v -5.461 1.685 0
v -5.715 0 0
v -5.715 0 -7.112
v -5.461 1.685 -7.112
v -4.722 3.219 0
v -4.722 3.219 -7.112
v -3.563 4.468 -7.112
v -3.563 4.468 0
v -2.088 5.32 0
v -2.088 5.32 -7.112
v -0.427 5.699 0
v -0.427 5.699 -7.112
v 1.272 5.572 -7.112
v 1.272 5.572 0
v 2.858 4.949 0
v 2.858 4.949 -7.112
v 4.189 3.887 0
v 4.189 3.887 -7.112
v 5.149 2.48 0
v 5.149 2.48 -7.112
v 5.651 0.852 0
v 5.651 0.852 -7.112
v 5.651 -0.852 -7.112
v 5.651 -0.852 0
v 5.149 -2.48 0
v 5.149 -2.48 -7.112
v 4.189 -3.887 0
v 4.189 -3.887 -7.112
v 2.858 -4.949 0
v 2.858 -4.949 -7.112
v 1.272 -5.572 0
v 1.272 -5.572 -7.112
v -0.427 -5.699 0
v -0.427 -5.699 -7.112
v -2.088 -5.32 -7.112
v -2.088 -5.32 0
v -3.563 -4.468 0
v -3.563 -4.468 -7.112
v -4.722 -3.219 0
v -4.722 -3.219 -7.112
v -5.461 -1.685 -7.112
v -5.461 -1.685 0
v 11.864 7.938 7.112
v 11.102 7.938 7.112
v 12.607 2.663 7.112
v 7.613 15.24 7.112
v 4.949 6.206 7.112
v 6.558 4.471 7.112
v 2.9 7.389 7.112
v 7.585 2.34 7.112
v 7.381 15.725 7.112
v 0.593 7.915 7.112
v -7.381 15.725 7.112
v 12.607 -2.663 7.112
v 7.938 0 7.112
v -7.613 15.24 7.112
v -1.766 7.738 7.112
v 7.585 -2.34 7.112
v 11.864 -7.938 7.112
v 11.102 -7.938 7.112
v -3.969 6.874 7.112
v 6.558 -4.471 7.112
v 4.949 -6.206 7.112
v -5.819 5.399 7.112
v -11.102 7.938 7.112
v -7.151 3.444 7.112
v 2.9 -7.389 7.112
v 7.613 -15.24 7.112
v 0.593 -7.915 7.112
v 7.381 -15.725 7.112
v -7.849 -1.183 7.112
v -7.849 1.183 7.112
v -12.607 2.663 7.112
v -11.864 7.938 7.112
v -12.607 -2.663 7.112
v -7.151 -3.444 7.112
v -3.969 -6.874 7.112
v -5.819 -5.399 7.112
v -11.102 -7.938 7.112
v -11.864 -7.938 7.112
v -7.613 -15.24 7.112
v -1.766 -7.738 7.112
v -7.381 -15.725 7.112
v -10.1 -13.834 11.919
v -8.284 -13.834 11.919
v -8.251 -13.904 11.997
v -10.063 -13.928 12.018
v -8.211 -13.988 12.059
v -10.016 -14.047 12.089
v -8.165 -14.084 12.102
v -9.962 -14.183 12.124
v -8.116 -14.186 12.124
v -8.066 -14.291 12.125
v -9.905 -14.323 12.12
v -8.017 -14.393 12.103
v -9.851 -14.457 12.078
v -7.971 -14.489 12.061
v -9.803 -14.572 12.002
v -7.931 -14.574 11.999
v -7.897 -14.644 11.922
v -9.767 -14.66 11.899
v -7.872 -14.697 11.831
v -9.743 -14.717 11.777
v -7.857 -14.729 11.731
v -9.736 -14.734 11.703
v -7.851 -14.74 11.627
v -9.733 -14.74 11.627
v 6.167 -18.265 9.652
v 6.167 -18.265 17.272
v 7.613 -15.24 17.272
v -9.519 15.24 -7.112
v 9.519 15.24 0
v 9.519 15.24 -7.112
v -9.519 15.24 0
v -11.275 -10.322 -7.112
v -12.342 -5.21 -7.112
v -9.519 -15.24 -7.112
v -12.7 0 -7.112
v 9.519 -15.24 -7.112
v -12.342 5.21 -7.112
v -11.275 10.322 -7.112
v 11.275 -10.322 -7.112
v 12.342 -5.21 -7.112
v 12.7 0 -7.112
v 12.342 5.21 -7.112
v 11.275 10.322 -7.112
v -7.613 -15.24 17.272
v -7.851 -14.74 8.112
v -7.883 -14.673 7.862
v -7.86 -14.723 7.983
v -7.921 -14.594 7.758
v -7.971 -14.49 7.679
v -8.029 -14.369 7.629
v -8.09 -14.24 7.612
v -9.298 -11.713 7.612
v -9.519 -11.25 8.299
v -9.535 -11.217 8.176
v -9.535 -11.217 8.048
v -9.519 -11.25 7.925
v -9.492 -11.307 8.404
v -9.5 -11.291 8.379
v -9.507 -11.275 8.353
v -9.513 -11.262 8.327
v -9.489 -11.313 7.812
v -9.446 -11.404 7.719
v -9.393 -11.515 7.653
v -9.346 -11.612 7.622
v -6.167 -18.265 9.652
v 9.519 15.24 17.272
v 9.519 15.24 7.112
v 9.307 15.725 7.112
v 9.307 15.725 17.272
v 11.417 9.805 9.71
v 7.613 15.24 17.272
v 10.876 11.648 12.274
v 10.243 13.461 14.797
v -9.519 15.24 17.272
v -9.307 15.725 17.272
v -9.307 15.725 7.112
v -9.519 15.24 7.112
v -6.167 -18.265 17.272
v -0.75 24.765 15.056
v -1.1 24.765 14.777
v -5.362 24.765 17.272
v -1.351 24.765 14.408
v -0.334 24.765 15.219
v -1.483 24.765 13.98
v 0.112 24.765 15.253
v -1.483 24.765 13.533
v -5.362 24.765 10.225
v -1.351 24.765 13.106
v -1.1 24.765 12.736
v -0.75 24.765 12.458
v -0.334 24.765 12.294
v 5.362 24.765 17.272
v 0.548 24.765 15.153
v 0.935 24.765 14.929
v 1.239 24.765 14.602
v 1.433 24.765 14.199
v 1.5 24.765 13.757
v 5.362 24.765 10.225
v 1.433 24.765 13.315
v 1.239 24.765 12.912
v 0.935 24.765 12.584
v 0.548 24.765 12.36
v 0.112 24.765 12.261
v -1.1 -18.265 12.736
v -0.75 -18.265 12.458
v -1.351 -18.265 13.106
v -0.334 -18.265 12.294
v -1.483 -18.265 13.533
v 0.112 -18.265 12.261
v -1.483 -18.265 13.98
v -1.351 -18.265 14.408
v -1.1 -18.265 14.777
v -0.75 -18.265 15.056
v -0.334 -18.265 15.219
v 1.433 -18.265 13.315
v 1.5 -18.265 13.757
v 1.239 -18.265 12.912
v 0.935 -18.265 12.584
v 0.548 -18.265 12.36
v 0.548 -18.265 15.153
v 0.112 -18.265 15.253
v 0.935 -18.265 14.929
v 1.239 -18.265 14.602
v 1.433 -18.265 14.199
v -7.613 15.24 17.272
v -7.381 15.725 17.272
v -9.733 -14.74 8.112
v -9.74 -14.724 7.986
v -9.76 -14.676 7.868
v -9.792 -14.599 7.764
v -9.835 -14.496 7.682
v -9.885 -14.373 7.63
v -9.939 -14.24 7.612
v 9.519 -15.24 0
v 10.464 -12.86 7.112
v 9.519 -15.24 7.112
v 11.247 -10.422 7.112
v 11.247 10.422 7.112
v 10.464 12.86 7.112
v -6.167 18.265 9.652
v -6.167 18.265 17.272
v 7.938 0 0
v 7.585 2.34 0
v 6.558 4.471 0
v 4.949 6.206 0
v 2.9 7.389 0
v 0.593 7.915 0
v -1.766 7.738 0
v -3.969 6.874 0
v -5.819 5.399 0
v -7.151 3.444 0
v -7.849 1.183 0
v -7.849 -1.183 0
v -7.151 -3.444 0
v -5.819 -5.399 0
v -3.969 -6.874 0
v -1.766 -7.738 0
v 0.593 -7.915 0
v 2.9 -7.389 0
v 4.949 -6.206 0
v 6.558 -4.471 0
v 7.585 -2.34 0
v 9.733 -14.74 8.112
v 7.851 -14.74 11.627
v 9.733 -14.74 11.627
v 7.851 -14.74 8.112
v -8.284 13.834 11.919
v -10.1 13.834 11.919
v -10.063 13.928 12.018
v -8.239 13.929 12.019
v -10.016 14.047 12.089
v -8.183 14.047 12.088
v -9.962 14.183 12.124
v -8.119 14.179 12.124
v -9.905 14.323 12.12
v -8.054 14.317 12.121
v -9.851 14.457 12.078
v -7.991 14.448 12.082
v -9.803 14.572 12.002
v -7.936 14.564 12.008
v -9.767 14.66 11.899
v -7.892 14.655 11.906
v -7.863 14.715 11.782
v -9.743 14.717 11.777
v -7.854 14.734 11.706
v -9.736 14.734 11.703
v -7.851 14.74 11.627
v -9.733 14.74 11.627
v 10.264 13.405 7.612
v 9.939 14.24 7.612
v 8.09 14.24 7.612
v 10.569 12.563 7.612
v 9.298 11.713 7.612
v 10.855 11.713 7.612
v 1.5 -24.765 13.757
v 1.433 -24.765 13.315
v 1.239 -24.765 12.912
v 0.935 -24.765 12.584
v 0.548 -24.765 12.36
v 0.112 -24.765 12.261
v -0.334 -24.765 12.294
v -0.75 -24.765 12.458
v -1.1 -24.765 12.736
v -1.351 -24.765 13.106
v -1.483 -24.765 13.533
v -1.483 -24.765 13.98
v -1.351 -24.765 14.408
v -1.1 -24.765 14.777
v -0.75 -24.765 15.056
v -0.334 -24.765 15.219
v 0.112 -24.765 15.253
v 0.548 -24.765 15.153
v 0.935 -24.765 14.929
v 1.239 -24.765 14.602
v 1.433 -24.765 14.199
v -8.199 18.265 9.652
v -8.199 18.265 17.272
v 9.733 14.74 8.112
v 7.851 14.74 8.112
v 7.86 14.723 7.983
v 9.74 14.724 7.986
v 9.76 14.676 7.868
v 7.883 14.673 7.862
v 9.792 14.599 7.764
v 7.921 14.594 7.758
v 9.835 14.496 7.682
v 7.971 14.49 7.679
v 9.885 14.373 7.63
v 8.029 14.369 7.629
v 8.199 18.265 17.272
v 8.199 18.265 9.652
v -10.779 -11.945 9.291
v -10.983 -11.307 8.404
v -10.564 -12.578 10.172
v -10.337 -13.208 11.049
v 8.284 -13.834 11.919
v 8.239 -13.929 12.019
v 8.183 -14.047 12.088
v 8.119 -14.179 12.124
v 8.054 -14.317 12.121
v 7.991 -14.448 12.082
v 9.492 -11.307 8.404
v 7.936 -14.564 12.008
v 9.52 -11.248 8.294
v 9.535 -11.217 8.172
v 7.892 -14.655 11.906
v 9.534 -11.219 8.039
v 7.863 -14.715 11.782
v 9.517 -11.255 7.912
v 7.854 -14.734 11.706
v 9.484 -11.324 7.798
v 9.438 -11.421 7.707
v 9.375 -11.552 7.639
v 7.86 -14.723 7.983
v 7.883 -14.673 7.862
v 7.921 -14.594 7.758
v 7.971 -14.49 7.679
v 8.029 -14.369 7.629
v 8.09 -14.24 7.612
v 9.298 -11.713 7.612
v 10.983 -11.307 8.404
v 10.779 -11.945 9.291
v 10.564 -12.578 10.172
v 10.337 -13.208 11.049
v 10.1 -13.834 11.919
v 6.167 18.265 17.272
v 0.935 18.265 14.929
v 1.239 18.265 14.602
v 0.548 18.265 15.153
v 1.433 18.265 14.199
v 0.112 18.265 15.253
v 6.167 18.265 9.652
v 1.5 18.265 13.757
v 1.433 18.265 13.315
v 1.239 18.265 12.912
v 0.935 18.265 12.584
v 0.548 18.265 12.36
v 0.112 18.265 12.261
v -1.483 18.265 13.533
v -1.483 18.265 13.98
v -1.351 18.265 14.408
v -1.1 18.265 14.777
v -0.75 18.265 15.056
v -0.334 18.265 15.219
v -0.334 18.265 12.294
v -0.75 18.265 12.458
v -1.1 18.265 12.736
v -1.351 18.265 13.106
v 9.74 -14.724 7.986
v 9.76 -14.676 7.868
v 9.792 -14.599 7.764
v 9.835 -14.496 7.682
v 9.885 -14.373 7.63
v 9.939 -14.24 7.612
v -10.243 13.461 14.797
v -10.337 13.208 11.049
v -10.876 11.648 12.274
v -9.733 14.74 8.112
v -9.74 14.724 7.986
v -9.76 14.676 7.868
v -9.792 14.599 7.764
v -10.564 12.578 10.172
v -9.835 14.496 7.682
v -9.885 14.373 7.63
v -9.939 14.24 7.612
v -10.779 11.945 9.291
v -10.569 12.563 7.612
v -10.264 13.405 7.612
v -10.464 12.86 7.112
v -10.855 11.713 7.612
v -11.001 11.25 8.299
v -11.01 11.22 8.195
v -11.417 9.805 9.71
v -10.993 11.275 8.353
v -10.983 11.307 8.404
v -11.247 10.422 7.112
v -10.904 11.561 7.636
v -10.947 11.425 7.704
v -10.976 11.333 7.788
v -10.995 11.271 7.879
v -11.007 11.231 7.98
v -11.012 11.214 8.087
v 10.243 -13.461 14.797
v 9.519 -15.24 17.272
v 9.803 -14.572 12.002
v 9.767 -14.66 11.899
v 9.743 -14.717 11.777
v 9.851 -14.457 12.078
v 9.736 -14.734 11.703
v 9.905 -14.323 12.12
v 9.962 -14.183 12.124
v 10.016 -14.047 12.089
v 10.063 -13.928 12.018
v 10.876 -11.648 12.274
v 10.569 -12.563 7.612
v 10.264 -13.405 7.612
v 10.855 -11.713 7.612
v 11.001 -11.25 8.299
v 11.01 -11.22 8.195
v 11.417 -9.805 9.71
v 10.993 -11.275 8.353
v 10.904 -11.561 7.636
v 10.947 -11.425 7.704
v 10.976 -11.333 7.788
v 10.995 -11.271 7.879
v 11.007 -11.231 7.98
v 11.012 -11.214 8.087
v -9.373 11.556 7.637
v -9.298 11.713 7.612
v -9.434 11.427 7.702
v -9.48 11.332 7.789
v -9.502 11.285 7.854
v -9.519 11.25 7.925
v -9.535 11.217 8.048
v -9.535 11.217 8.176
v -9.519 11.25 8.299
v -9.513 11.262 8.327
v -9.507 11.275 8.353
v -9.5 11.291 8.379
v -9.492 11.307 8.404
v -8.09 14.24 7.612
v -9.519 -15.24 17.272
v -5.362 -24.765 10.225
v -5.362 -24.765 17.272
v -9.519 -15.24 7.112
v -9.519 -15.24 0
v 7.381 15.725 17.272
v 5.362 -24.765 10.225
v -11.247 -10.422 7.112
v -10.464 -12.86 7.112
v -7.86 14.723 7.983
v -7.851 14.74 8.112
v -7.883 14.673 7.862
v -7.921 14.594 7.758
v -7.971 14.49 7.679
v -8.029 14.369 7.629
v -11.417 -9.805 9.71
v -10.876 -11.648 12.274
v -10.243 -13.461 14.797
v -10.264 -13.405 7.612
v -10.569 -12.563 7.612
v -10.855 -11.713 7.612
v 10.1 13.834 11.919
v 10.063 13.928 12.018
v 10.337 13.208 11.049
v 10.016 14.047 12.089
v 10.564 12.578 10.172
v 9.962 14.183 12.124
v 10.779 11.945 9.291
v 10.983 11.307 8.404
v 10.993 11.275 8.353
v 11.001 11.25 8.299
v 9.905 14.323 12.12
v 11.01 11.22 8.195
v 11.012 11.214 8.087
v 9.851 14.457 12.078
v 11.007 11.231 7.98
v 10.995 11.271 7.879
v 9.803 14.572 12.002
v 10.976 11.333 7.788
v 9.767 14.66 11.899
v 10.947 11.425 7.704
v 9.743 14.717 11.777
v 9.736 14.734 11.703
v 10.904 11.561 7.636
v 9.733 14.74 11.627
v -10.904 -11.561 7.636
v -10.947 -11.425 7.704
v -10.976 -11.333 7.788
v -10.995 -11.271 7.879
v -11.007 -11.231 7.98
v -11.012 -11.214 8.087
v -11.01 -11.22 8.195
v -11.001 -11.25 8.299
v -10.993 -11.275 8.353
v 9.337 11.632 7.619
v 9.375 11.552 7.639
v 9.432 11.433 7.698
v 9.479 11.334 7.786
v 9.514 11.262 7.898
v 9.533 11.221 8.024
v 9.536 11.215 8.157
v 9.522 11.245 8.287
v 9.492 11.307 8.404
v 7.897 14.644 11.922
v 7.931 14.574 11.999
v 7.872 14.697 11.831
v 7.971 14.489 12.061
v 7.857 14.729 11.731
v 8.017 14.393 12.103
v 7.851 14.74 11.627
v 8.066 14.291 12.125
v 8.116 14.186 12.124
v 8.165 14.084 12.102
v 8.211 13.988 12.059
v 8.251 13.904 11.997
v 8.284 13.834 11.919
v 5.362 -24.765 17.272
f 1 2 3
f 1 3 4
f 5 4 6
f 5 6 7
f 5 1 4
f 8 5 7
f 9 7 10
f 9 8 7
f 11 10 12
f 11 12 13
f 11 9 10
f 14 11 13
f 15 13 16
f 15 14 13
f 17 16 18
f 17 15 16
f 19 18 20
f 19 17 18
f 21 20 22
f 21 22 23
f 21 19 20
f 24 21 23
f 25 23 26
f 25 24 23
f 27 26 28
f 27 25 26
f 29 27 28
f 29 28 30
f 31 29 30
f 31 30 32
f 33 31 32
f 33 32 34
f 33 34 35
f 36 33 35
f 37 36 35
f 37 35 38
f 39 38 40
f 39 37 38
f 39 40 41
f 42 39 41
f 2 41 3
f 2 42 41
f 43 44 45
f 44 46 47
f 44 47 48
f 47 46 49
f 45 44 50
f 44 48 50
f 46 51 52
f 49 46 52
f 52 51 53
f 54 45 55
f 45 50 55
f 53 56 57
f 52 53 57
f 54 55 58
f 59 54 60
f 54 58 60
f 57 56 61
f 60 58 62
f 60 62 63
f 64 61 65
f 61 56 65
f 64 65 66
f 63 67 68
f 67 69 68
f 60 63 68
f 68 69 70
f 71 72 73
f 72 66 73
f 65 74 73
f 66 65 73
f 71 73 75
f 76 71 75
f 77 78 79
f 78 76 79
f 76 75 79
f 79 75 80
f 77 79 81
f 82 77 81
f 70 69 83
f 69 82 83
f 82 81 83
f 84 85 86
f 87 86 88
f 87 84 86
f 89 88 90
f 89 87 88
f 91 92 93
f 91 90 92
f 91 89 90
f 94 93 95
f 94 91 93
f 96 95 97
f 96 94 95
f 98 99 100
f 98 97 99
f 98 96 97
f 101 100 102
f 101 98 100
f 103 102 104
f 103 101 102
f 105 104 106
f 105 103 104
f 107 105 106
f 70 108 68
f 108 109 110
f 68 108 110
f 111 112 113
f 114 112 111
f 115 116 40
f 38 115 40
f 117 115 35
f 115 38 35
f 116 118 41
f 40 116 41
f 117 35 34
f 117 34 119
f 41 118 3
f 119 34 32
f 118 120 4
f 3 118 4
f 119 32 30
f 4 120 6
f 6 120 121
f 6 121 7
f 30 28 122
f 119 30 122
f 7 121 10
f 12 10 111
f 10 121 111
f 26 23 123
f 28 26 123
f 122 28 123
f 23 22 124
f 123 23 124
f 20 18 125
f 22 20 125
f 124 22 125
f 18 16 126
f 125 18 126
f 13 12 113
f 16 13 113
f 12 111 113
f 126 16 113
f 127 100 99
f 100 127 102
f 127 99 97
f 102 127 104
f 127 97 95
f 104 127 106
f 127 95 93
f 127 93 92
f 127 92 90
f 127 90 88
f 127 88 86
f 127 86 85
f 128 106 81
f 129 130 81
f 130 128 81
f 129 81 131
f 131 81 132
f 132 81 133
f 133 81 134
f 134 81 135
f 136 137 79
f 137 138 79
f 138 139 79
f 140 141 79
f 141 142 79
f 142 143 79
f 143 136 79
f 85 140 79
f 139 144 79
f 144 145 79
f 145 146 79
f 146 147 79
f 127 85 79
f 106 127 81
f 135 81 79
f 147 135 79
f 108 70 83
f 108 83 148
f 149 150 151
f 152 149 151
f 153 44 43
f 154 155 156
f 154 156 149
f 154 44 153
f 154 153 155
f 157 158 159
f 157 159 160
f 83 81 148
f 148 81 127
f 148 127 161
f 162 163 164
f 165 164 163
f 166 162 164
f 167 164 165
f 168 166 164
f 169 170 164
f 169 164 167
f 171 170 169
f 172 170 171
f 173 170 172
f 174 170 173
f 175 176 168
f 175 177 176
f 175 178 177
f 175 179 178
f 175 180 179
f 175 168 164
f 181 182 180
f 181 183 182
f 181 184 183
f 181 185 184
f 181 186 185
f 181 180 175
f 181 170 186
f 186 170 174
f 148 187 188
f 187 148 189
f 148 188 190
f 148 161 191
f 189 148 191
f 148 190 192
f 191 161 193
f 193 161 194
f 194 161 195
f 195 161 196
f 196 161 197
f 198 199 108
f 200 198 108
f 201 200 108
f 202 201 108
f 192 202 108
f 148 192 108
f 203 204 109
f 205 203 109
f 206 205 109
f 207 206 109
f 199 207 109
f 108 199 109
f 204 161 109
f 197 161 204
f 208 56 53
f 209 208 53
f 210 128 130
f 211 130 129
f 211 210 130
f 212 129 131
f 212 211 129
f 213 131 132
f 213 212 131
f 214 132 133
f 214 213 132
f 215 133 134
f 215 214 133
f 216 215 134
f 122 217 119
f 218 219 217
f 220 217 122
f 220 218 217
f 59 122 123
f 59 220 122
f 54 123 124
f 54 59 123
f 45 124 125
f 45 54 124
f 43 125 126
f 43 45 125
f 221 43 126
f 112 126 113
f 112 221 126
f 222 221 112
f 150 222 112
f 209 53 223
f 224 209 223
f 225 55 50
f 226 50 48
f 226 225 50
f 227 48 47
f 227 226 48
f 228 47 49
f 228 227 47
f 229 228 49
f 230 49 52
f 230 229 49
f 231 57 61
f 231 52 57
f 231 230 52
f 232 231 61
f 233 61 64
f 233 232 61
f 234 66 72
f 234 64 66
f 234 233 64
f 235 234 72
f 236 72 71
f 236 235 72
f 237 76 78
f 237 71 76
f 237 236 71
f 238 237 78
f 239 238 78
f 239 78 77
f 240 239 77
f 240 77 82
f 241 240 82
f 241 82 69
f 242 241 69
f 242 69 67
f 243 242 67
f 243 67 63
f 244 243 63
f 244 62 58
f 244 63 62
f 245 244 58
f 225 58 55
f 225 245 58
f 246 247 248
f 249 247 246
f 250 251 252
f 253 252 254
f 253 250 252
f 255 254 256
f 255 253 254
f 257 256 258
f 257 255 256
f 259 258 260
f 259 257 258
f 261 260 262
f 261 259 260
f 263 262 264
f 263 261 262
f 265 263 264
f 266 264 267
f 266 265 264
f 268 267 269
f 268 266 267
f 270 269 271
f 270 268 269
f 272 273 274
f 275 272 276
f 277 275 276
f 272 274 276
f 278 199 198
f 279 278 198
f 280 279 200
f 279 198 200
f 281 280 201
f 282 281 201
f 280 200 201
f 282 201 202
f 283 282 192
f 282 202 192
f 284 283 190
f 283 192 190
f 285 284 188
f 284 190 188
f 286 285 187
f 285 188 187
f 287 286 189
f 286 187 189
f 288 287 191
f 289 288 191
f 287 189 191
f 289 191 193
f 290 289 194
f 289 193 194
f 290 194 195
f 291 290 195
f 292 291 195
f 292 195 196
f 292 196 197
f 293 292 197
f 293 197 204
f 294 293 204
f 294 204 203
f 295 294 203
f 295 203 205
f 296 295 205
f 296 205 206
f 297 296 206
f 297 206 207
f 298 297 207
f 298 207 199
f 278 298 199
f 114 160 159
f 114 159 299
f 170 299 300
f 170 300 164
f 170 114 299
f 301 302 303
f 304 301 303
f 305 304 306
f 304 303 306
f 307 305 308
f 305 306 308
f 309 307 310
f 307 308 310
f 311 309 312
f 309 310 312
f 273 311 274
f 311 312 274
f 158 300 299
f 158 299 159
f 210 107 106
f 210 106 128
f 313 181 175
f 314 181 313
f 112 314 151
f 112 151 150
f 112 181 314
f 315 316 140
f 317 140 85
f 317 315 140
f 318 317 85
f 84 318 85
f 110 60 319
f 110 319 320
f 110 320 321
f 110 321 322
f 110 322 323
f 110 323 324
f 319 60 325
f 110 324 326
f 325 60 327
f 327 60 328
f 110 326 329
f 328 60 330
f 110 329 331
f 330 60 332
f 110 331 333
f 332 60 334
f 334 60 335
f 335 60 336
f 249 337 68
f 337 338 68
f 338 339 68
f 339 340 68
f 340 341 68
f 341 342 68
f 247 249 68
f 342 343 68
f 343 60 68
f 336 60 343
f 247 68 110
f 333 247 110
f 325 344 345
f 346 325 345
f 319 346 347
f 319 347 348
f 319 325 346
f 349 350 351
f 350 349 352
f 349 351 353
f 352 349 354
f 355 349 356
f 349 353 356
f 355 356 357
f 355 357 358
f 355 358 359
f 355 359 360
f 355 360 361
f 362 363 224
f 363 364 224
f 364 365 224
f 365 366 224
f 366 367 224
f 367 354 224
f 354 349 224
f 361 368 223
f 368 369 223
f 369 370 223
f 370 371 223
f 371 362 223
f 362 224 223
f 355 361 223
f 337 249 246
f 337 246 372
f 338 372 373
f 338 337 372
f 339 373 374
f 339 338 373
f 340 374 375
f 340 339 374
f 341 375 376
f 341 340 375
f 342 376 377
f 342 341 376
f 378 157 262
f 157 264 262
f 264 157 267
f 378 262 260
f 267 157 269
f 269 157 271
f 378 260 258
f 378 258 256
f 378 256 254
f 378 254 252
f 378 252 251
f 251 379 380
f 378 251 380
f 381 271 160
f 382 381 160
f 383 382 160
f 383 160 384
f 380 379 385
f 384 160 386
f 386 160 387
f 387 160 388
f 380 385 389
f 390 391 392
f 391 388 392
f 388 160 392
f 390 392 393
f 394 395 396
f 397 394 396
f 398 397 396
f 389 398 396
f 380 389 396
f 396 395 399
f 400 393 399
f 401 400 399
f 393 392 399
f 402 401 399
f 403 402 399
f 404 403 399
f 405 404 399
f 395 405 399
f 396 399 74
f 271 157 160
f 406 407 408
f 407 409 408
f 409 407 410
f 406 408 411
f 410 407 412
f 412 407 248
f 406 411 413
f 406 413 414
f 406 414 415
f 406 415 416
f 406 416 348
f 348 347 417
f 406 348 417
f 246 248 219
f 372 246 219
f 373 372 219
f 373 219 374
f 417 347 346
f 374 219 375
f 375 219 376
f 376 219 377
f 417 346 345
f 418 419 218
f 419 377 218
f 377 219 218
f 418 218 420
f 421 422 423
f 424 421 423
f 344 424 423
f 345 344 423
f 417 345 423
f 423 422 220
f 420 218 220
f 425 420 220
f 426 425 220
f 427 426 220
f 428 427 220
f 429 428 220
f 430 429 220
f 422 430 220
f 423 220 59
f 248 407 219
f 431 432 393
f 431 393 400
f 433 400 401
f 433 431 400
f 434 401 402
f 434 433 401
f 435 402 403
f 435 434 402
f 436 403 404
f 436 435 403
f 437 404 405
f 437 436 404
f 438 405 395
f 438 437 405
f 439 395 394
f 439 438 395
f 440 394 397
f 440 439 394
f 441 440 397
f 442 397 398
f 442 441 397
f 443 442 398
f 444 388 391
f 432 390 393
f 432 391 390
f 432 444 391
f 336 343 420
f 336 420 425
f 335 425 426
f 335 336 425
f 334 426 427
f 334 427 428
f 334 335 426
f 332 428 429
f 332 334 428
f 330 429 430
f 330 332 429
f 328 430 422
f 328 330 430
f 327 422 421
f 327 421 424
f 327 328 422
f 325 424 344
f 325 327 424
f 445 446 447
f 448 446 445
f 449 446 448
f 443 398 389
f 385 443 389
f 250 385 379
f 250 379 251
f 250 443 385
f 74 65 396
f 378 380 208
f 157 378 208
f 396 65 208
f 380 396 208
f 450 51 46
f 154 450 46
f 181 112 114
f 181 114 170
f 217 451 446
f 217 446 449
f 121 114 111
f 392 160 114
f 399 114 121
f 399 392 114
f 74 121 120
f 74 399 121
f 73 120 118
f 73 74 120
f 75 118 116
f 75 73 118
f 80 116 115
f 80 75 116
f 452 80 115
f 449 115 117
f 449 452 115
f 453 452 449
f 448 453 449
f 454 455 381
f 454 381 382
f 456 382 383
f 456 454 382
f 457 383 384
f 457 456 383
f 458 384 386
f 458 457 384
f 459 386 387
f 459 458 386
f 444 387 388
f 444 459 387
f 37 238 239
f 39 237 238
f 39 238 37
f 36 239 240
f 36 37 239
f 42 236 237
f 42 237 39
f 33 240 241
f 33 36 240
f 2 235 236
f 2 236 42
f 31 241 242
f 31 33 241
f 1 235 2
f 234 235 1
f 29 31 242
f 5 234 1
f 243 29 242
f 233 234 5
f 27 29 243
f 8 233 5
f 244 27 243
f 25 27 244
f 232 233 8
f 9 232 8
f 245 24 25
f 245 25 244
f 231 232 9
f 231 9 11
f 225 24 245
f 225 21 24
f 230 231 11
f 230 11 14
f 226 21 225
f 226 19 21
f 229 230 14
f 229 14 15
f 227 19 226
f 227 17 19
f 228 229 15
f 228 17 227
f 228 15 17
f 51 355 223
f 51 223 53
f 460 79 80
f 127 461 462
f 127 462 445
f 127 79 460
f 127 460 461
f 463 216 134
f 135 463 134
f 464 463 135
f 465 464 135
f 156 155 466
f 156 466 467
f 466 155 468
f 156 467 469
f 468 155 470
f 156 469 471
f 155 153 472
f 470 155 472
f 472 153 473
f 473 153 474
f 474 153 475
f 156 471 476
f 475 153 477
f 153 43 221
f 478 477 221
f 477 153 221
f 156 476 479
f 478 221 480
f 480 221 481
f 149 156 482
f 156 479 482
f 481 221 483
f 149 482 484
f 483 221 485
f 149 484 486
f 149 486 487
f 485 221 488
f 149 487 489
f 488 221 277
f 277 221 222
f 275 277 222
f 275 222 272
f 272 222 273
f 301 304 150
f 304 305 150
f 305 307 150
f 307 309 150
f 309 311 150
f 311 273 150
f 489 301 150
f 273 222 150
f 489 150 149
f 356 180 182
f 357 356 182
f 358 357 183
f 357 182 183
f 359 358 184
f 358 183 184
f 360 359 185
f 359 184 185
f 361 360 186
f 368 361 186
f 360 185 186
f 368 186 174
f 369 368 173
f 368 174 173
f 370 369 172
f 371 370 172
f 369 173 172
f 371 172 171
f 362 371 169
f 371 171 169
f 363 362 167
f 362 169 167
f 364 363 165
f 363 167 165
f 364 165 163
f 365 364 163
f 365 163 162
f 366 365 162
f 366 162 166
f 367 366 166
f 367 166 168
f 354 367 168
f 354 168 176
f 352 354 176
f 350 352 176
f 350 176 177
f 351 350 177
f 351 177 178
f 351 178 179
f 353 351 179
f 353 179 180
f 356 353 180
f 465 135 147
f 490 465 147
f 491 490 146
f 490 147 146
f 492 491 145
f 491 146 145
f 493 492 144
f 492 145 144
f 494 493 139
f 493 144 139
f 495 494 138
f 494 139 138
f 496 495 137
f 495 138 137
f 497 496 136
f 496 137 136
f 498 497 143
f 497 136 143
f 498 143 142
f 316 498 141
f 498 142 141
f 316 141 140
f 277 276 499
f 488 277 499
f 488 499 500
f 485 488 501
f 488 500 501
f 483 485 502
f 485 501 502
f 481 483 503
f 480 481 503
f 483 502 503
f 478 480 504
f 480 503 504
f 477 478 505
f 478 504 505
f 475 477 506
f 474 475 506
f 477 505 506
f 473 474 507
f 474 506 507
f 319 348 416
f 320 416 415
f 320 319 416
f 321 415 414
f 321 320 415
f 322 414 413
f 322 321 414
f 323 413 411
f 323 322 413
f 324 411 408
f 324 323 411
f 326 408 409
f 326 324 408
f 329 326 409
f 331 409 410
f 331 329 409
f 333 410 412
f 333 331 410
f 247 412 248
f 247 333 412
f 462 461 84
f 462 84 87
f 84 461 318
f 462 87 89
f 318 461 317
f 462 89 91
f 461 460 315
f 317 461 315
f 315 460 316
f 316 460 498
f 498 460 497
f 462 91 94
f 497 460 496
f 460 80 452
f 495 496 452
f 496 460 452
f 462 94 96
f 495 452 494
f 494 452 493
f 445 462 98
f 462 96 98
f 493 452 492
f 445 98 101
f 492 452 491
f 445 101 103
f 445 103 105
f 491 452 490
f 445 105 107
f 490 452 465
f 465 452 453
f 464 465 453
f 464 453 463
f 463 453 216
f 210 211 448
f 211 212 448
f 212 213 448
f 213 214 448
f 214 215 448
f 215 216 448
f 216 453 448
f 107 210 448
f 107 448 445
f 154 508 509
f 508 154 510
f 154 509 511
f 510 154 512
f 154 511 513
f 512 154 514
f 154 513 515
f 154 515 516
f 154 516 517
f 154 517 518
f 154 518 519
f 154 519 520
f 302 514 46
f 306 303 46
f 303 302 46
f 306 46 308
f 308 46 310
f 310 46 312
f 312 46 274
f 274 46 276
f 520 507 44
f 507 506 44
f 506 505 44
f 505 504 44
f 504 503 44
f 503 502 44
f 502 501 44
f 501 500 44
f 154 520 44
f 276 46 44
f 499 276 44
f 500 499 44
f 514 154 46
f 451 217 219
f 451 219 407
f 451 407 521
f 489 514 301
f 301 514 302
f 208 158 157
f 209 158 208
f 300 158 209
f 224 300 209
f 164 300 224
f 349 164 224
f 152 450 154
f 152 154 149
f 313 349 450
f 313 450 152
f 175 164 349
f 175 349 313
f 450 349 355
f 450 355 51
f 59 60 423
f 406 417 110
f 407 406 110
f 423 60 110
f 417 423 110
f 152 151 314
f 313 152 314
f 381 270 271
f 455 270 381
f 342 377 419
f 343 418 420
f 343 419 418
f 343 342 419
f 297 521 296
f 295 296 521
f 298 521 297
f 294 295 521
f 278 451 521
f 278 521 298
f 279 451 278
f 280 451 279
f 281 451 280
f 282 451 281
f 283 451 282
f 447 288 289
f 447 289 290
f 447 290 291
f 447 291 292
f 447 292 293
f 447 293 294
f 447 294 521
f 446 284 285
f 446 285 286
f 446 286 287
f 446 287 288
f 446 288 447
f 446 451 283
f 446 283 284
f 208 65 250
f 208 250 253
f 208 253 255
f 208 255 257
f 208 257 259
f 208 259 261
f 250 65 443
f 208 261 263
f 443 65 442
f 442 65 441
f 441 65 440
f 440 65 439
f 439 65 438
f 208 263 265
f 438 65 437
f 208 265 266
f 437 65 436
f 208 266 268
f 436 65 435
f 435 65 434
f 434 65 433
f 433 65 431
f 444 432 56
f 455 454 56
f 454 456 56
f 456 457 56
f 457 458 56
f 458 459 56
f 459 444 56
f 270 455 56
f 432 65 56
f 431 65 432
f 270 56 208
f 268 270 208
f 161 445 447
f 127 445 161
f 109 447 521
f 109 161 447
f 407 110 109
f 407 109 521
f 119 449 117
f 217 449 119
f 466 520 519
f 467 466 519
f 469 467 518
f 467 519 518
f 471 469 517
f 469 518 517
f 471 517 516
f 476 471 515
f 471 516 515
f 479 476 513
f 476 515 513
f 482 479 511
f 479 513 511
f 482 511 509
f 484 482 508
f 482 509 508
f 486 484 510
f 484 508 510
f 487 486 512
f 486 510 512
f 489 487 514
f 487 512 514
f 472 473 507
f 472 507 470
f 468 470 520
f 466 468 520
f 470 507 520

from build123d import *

# Parameters (mm, degrees)
SKETCH1_R               = 7.9375
BOSS_EXTRUDE1_DEPTH     = 7.112
SKETCH2_R               = 5.715
BOSS_EXTRUDE2_DEPTH     = 7.112
BOSS_EXTRUDE3_DEPTH     = 10.16
SKETCH4_R               = 1.5
CUT_EXTRUDE1_DEPTH      = 50.53
CUT_EXTRUDE2_DEPTH      = 23.219226796
BOSS_EXTRUDE5_DEPTH     = 10.16
CUT_EXTRUDE3_DEPTH      = 4.180773204
CUT_EXTRUDE3_DEPTH_BACK = 23.219226796
CUT_EXTRUDE5_DEPTH      = 23.219226896
CUT_EXTRUDE6_DEPTH      = 10.16
BOSS_EXTRUDE6_DEPTH     = 10.16
CUT_EXTRUDE7_DEPTH      = 4.180773304
CUT_EXTRUDE7_DEPTH_BACK = 23.219226896
BOSS_EXTRUDE7_START     = -16.899912
BOSS_EXTRUDE7_DEPTH     = 14.76137


with BuildPart() as part:
    # Sketch1 → Boss-Extrude1 (new body)
    with BuildSketch(Plane.XY):
        with BuildLine():
            ThreePointArc((9.519226796, 15.24), (12.7, 0), (9.519226796, -15.24))
            Line((9.519226796, -15.24), (-9.519226796, -15.24))
            ThreePointArc((-9.519226796, -15.24), (-12.7, 0), (-9.519226796, 15.24))
            Line((-9.519226796, 15.24), (9.519226796, 15.24))
        make_face()
        Circle(SKETCH1_R, mode=Mode.SUBTRACT)
        Polygon((5.362175987, 24.765), (9.519226796, 15.24), (-9.519226796, 15.24), (-5.362175987, 24.765), align=None)
        Polygon((-9.519226796, -15.24), (9.519226796, -15.24), (5.362175987, -24.765), (-5.362175987, -24.765), align=None)
    extrude(amount=BOSS_EXTRUDE1_DEPTH)

    # Sketch2 → Boss-Extrude2 (add)
    with BuildSketch(Plane(origin=(0, 0, 0), x_dir=(-1, 0, 0), z_dir=(0, 0, -1))):
        with BuildLine():
            Line((9.519226796, -15.24), (-9.519226796, -15.24))
            ThreePointArc((-9.519226796, -15.24), (-12.7, 0), (-9.519226796, 15.24))
            Line((-9.519226796, 15.24), (9.519226796, 15.24))
            ThreePointArc((9.519226796, 15.24), (12.7, 0), (9.519226796, -15.24))
        make_face()
        Circle(SKETCH2_R, mode=Mode.SUBTRACT)
    extrude(amount=BOSS_EXTRUDE2_DEPTH)

    # Sketch3 → Boss-Extrude3 (add)
    with BuildSketch(Plane.XY.offset(7.112)):
        Polygon((5.362175987, 24.765), (9.519226796, 15.24), (-9.519226796, 15.24), (-5.362175987, 24.765), align=None)
        Polygon((5.362175987, -24.765), (9.519226796, -15.24), (-9.519226796, -15.24), (-5.362175987, -24.765), align=None)
    extrude(amount=BOSS_EXTRUDE3_DEPTH)

    # Sketch4 → Cut-Extrude1 (cut, through all)
    with BuildSketch(Plane(origin=(0, 24.765, 0), x_dir=(1, 0, 0), z_dir=(0, 1, 0))):
        with Locations((0, -13.756694386)):
            Circle(SKETCH4_R)
    extrude(amount=-CUT_EXTRUDE1_DEPTH, mode=Mode.SUBTRACT)

    # Sketch5 → Cut-Extrude2 (cut, through all)
    with BuildSketch(Plane.ZY.offset(9.519226796)):
        Polygon((0, 15.24), (10.224694386, 24.765), (0, 24.765), align=None)
        Polygon((17.272, 15.24), (17.272, 18.26514), (9.652, 18.26514), (7.112, 15.72514), (7.112, 15.24), align=None)
    extrude(amount=-CUT_EXTRUDE2_DEPTH, mode=Mode.SUBTRACT)

    # Sketch6 → Boss-Extrude5 (add)
    with BuildSketch(Plane.XY.offset(7.112)):
        with BuildLine():
            Line((-7.612509174, 15.24), (-9.519226796, 15.24))
            ThreePointArc((-9.519226796, 15.24), (-10.875837369, 11.647902093), (-11.864005337, 7.9375))
            Line((-11.864005337, 7.9375), (-11.102005337, 7.9375))
            Line((-11.102005337, 7.9375), (-7.612509174, 15.24))
        make_face()
        Polygon((-9.307494341, 15.72514), (-9.519226796, 15.24), (-7.612509174, 15.24), (-7.380685255, 15.72514), align=None)
        Polygon((-8.198947459, 18.26514), (-9.307494341, 15.72514), (-7.380685255, 15.72514), (-6.166947459, 18.26514), align=None)
        Polygon((8.198947459, 18.26514), (6.166947459, 18.26514), (7.380685255, 15.72514), (9.307494341, 15.72514), align=None)
        Polygon((7.380685255, 15.72514), (7.612509174, 15.24), (9.519226796, 15.24), (9.307494341, 15.72514), align=None)
        with BuildLine():
            Line((9.519226796, 15.24), (7.612509174, 15.24))
            Line((7.612509174, 15.24), (11.102005337, 7.9375))
            Line((11.102005337, 7.9375), (11.864005337, 7.9375))
            ThreePointArc((11.864005337, 7.9375), (10.875837369, 11.647902093), (9.519226796, 15.24))
        make_face()
    extrude(amount=BOSS_EXTRUDE5_DEPTH)

    # Sketch7 → Cut-Extrude3 (cut, two sides)
    with BuildSketch(Plane.ZY.offset(9.519226796)) as cut_extrude3_sk:
        Polygon((7.112, 7.9375), (17.272, 15.24), (17.272, 7.9375), align=None)
        with BuildLine():
            Line((8.403818024, 11.307371095), (11.919117111, 13.833992314))
            ThreePointArc((11.919117111, 13.833992314), (12.103221267, 14.39329083), (11.627299087, 14.74))
            Line((11.627299087, 14.74), (8.112, 14.74))
            ThreePointArc((8.112, 14.74), (7.758446609, 14.593553391), (7.612, 14.24))
            Line((7.612, 14.24), (7.612, 11.713378781))
            ThreePointArc((7.612, 11.713378781), (7.883865185, 11.268457995), (8.403818024, 11.307371095))
        make_face()
    extrude(amount=CUT_EXTRUDE3_DEPTH, mode=Mode.SUBTRACT)
    extrude(cut_extrude3_sk.sketch, amount=-CUT_EXTRUDE3_DEPTH_BACK, mode=Mode.SUBTRACT)

    # Sketch9 → Cut-Extrude5 (cut, through all)
    with BuildSketch(Plane.ZY.offset(9.519226796)):
        Polygon((0, -24.765), (10.224694386, -24.765), (0, -15.24), align=None)
    extrude(amount=-CUT_EXTRUDE5_DEPTH, mode=Mode.SUBTRACT)

    # Sketch8 → Cut-Extrude6 (cut)
    with BuildSketch(Plane.XY.offset(17.272)):
        Polygon((7.612509174, -15.24), (-7.612509174, -15.24), (-6.166947459, -18.26514), (6.166947459, -18.26514), align=None)
    extrude(amount=-CUT_EXTRUDE6_DEPTH, mode=Mode.SUBTRACT)

    # Sketch10 → Boss-Extrude6 (add)
    with BuildSketch(Plane.XY.offset(7.112)):
        with BuildLine():
            Line((-9.519226796, -15.24), (-7.612509174, -15.24))
            Line((-7.612509174, -15.24), (-11.102005337, -7.9375))
            Line((-11.102005337, -7.9375), (-11.864005337, -7.9375))
            ThreePointArc((-11.864005337, -7.9375), (-10.875837369, -11.647902093), (-9.519226796, -15.24))
        make_face()
        with BuildLine():
            Line((7.612509174, -15.24), (9.519226796, -15.24))
            ThreePointArc((9.519226796, -15.24), (10.875837369, -11.647902093), (11.864005337, -7.9375))
            Line((11.864005337, -7.9375), (11.102005337, -7.9375))
            Line((11.102005337, -7.9375), (7.612509174, -15.24))
        make_face()
    extrude(amount=BOSS_EXTRUDE6_DEPTH)

    # Sketch11 → Cut-Extrude7 (cut, two sides)
    with BuildSketch(Plane.ZY.offset(9.519226796)) as cut_extrude7_sk:
        Polygon((17.272, -15.24), (17.272, -7.9375), (7.112, -7.9375), align=None)
        with BuildLine():
            ThreePointArc((8.112, -14.74), (7.758446609, -14.593553391), (7.612, -14.24))
            Line((7.612, -14.24), (7.612, -11.713378781))
            ThreePointArc((7.612, -11.713378781), (7.883865185, -11.268457995), (8.403818024, -11.307371095))
            Line((8.403818024, -11.307371095), (11.919117111, -13.833992314))
            ThreePointArc((11.919117111, -13.833992314), (12.103221267, -14.39329083), (11.627299087, -14.74))
            Line((11.627299087, -14.74), (8.112, -14.74))
        make_face()
    extrude(amount=CUT_EXTRUDE7_DEPTH, mode=Mode.SUBTRACT)
    extrude(cut_extrude7_sk.sketch, amount=-CUT_EXTRUDE7_DEPTH_BACK, mode=Mode.SUBTRACT)

    # Sketch12 → Boss-Extrude7 (add)
    with BuildSketch(Plane.ZY.offset(9.519226796).offset(BOSS_EXTRUDE7_START)):
        Polygon((7.112, -18.26514), (7.112, -15.72514), (9.652, -18.26514), align=None)
    extrude(amount=BOSS_EXTRUDE7_DEPTH)


solid = part.part
